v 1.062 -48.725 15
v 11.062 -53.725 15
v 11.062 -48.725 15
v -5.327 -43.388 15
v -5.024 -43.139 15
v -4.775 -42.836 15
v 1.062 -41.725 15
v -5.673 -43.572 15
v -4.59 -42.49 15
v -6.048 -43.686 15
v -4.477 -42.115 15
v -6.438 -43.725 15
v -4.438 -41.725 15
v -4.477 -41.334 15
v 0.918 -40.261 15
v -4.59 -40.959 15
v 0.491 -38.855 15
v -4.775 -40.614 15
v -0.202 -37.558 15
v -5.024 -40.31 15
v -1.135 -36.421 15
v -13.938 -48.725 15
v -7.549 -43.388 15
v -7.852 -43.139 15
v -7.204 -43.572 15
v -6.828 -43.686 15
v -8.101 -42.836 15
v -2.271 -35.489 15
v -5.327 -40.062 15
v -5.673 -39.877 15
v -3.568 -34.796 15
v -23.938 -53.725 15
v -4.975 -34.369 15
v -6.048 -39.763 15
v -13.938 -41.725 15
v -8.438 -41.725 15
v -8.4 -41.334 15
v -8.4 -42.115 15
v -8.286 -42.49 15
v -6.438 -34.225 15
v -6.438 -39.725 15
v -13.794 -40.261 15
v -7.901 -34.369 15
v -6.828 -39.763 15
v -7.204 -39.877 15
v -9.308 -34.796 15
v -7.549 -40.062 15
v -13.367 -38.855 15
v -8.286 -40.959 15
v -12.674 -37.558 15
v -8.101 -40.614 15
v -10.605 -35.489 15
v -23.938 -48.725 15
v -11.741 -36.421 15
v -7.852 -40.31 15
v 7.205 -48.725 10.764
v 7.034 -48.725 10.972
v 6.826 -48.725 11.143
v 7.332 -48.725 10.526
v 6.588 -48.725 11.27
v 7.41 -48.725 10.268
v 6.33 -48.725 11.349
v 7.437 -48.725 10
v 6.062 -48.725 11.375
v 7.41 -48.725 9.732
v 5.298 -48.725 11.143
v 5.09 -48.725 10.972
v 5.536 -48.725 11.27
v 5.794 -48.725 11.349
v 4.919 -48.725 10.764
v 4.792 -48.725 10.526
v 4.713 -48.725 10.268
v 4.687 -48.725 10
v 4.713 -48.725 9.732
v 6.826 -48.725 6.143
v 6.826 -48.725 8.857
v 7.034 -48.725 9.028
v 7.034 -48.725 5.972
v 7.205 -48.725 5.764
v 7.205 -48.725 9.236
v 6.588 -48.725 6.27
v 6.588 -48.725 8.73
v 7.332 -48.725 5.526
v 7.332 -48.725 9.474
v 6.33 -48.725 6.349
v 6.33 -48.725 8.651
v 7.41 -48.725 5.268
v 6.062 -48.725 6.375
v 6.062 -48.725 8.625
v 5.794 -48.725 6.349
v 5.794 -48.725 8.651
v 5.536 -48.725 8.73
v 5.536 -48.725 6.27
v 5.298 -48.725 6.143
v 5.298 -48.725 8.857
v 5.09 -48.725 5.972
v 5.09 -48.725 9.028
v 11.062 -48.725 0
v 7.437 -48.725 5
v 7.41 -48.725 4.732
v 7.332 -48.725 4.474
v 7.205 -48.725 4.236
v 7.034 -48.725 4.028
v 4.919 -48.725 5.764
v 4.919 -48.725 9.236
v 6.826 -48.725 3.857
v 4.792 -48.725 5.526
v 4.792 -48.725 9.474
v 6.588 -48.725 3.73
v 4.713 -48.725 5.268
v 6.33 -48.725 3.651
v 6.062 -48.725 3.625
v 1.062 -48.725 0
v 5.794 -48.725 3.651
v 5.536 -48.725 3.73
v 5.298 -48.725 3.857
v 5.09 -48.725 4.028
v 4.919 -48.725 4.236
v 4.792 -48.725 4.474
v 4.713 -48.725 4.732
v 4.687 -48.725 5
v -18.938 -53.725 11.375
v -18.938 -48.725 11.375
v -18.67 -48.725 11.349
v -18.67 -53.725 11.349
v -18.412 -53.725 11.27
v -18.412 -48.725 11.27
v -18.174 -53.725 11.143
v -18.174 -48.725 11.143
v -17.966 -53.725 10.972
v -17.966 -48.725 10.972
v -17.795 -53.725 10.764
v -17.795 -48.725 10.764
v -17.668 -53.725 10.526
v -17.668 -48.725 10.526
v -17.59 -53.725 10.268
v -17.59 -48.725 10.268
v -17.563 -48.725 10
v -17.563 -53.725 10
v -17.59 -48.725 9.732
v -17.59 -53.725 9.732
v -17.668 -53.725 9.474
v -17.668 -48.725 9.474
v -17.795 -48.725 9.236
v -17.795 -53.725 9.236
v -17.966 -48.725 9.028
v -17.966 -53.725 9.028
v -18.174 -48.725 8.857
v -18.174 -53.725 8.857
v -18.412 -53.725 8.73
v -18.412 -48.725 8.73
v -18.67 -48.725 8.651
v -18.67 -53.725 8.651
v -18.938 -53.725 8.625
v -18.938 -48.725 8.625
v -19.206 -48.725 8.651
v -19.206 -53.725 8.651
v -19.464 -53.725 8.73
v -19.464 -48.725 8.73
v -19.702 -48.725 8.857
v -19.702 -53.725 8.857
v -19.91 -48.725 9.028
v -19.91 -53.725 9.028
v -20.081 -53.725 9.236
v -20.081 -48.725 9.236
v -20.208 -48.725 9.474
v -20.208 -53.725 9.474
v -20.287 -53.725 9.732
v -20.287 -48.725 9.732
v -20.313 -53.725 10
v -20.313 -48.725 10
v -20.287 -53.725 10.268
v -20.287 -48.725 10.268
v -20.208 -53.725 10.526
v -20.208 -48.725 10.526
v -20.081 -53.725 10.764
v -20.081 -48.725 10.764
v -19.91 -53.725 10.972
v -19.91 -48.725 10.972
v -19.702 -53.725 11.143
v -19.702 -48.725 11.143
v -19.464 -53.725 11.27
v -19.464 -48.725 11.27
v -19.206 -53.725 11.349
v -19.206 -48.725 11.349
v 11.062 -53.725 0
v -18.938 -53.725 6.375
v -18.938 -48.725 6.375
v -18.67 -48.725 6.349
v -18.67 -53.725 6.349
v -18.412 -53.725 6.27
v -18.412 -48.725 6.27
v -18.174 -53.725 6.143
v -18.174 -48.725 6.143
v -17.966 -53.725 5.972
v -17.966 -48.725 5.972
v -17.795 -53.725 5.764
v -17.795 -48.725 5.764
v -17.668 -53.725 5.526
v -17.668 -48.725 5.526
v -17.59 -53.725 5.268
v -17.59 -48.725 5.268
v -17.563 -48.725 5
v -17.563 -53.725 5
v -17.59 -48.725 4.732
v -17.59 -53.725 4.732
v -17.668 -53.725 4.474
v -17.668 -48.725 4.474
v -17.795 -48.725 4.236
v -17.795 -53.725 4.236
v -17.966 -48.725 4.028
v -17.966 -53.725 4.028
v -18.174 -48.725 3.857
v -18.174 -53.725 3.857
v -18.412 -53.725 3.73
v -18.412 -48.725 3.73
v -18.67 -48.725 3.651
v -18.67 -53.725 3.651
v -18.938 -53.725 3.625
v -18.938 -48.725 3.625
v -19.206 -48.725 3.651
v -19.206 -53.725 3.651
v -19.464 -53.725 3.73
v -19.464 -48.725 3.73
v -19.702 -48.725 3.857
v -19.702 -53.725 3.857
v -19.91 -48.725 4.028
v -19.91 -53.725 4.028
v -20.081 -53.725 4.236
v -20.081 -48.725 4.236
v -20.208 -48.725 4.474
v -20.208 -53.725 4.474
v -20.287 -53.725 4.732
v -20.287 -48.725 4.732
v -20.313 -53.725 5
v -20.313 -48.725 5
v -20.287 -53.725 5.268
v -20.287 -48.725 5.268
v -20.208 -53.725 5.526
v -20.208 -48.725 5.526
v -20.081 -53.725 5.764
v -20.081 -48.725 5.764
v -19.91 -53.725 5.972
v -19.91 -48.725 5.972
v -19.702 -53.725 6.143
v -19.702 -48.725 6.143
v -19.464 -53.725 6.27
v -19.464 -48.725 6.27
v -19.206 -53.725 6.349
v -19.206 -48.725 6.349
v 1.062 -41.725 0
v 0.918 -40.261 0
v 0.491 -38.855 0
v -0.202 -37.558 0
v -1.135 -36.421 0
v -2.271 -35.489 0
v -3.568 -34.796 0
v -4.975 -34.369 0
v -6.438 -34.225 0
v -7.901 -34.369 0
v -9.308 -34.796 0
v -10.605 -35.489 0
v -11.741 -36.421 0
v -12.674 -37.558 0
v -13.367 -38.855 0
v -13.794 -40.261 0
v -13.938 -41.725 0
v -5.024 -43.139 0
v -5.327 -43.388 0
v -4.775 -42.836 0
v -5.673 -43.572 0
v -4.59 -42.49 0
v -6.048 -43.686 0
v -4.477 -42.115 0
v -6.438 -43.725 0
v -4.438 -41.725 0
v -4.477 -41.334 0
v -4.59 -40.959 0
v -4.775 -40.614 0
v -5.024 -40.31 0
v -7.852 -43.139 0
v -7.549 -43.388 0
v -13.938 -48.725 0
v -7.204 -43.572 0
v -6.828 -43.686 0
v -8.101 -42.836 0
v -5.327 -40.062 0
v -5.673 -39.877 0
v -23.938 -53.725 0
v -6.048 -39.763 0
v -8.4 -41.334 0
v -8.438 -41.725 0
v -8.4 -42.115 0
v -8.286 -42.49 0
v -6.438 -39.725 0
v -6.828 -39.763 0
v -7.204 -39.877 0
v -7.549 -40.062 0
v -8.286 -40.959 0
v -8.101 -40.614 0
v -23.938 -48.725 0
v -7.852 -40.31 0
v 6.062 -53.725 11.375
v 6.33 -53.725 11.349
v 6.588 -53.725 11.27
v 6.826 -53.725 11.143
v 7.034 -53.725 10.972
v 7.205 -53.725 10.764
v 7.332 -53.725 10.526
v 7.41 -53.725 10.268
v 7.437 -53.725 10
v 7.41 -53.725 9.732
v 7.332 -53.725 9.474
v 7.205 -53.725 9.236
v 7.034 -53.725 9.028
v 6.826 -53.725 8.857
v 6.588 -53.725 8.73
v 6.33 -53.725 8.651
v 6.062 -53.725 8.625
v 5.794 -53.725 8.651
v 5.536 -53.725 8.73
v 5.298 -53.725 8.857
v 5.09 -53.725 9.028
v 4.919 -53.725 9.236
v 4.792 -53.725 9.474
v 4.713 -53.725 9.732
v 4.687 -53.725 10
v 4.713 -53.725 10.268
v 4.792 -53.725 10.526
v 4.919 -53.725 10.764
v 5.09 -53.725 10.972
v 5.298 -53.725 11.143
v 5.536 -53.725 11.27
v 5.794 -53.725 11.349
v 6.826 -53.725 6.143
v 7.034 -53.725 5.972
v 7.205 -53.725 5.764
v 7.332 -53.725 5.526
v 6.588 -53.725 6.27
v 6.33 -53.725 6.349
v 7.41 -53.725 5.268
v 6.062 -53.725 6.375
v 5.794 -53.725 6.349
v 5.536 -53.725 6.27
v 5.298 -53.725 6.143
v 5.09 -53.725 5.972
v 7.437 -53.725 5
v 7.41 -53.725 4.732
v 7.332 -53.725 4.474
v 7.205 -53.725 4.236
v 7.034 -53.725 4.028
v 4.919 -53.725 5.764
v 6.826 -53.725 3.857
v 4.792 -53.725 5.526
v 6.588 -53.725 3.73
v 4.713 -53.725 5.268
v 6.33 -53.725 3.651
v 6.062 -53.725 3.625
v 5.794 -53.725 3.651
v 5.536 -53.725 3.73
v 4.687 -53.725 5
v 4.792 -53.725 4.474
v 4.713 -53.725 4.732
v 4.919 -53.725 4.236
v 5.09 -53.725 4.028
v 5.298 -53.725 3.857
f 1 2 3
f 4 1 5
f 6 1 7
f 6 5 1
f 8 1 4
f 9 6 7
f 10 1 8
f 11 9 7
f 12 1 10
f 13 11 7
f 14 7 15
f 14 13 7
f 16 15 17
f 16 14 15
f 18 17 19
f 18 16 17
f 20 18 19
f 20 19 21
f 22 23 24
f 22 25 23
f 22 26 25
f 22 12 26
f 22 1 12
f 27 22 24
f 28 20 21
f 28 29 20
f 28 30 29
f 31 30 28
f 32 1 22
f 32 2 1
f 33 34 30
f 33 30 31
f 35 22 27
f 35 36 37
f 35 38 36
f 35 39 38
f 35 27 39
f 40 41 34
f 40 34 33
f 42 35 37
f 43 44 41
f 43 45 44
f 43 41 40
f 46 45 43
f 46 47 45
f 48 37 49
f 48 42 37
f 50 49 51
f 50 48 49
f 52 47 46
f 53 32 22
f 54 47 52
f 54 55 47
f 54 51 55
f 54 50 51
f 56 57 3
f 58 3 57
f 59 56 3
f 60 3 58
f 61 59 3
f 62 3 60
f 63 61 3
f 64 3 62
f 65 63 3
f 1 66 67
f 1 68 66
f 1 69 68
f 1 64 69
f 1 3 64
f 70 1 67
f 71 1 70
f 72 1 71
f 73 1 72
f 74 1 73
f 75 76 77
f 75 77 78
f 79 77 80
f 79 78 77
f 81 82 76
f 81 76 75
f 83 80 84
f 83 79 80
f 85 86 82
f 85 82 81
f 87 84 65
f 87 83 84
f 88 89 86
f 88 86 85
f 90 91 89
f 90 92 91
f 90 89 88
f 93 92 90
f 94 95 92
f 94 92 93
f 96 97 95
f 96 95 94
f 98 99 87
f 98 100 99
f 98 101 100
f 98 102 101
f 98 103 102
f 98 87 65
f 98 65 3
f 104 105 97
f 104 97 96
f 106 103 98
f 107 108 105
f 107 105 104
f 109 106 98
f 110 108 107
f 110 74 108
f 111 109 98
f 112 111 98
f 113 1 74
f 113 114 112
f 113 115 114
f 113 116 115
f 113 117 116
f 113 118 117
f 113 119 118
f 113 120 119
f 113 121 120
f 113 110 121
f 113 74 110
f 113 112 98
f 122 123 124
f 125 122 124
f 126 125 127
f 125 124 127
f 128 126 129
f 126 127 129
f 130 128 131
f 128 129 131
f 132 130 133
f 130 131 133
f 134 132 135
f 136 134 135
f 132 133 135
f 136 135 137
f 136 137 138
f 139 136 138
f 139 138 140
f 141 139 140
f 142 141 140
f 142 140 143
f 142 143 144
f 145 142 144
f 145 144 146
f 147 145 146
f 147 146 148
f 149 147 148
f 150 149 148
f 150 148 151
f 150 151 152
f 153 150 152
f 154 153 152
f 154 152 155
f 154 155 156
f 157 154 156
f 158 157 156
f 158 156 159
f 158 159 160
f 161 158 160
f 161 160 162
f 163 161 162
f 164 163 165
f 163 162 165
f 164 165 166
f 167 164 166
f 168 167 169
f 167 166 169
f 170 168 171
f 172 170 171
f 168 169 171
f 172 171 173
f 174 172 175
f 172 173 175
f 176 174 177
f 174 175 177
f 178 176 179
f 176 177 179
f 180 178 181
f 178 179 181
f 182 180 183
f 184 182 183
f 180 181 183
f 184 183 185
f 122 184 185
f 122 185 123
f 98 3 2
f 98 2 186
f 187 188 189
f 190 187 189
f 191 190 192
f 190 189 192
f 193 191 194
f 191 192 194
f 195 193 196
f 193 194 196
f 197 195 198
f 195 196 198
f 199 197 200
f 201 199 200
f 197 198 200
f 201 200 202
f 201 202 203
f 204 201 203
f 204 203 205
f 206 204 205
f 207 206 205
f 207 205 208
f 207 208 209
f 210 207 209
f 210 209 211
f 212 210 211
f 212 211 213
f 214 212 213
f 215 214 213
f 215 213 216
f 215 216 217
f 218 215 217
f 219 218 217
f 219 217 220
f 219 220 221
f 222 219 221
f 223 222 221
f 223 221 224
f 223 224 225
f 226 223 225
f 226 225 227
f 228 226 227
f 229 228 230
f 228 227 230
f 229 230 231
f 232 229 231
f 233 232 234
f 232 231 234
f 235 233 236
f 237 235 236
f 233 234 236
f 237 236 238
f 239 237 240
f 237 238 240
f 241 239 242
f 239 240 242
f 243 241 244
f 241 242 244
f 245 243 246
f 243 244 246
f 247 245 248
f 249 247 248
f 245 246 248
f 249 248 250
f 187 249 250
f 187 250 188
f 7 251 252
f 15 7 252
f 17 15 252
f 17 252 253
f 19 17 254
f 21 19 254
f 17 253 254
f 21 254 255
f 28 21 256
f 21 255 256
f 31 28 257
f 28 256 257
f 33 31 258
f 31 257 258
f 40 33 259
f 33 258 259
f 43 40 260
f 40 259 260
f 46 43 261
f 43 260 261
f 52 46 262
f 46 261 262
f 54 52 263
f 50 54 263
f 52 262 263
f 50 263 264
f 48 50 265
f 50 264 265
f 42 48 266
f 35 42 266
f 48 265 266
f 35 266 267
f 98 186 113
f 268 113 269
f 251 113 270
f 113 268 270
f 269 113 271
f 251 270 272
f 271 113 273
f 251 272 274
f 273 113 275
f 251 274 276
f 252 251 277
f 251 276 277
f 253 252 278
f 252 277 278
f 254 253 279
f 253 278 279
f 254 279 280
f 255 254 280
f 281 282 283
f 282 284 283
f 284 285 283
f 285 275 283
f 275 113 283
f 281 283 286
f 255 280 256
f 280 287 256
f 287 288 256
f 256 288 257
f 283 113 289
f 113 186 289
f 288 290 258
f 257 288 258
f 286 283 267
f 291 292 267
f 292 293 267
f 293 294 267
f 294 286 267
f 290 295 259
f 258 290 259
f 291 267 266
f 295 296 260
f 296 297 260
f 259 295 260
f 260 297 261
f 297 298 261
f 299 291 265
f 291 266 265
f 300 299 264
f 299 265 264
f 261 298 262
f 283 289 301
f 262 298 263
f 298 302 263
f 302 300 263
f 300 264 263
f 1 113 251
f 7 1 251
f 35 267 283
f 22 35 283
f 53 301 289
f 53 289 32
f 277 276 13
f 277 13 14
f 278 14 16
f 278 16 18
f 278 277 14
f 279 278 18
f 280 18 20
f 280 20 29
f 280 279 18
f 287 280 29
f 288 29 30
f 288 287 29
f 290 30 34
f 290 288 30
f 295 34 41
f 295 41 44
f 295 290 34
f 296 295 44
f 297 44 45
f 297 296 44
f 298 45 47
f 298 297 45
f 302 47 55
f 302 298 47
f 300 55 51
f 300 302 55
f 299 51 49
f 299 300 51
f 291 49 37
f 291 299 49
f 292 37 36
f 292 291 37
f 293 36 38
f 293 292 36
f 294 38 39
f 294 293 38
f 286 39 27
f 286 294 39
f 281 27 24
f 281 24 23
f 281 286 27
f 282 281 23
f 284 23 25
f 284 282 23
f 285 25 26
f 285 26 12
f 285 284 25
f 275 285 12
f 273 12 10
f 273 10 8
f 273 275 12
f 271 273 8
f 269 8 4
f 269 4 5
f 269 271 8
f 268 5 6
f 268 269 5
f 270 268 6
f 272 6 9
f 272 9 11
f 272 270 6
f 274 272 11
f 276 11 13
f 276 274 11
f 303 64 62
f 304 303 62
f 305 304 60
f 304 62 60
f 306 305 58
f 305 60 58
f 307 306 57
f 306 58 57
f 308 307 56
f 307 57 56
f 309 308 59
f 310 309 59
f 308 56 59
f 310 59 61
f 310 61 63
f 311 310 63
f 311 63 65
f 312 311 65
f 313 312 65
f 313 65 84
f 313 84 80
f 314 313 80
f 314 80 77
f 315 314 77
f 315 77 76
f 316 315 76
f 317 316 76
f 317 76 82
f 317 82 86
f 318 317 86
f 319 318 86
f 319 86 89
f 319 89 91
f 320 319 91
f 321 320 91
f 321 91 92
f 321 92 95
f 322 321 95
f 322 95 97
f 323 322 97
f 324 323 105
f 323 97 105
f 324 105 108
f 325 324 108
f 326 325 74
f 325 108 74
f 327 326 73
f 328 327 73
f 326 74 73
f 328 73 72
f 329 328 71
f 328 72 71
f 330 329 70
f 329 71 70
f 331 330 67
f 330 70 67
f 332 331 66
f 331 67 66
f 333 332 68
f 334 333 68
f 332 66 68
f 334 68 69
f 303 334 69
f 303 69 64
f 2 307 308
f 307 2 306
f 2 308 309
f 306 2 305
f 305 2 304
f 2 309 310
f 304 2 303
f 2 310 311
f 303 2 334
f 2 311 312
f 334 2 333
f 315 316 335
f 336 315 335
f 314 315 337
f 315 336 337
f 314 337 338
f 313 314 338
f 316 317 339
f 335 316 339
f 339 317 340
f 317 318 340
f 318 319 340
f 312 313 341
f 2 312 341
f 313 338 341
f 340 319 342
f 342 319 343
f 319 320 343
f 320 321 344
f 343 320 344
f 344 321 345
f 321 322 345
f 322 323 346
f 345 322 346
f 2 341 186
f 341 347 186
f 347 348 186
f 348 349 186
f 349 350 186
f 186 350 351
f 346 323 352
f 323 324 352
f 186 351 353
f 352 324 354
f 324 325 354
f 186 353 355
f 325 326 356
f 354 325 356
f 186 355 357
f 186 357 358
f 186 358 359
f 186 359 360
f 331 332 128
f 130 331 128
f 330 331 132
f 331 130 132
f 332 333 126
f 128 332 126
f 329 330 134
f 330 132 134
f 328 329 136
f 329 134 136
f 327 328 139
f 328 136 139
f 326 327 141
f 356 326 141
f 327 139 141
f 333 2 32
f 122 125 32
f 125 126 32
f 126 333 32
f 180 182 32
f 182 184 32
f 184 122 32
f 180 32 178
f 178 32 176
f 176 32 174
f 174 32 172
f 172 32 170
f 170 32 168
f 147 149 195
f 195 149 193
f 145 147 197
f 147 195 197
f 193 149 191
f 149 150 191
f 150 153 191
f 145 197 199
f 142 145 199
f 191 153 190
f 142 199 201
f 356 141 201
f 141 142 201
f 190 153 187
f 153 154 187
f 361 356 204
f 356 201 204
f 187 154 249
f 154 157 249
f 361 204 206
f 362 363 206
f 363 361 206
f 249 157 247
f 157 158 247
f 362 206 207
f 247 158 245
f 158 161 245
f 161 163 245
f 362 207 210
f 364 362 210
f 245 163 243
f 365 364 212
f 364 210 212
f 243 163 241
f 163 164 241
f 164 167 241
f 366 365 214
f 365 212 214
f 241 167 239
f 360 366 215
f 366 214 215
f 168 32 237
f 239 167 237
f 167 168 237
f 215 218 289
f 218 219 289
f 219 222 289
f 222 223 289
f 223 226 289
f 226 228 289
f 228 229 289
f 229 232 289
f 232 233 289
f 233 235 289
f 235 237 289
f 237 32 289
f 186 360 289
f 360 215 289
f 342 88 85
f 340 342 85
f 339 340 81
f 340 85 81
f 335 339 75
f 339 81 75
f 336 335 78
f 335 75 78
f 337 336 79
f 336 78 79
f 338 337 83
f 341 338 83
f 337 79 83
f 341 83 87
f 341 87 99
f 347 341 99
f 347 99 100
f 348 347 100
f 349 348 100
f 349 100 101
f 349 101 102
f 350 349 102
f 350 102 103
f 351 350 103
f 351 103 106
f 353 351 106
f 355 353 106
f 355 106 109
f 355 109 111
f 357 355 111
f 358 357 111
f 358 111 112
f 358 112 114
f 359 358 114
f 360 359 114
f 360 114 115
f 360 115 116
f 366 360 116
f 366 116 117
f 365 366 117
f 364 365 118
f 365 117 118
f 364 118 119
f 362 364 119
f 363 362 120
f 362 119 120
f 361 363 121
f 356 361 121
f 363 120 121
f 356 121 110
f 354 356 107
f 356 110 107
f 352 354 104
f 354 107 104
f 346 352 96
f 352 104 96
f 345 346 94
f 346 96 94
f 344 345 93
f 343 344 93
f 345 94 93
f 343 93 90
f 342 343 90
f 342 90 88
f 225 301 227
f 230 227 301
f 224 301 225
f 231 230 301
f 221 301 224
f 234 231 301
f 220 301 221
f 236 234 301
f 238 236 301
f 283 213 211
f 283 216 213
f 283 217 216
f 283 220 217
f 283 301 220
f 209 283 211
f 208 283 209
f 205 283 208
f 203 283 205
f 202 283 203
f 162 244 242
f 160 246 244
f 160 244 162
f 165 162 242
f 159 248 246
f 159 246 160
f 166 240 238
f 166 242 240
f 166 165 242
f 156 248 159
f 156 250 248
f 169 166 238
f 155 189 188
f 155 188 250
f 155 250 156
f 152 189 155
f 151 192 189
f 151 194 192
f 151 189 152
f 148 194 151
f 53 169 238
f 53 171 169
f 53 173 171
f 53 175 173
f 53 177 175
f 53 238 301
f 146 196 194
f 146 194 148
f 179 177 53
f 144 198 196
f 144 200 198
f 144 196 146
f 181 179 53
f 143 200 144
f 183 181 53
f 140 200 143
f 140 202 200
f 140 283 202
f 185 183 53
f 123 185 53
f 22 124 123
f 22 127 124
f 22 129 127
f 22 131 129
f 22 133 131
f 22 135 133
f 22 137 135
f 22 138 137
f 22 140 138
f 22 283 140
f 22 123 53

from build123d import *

# Parameters (mm, degrees)
SKETCH1_R           = 2
BOSS_EXTRUDE1_DEPTH = 15
SKETCH8_W           = 15
SKETCH8_H           = 5
BOSS_EXTRUDE6_DEPTH = 10
SKETCH9_W           = 15
SKETCH9_H           = 5
BOSS_EXTRUDE7_DEPTH = 10
SKETCH10_R          = 1.375
CUT_EXTRUDE1_DEPTH  = 32.753503892


with BuildPart() as part:
    # Sketch1 → Boss-Extrude1 (new body)
    with BuildSketch(Plane.XY):
        with BuildLine():
            Line((-13.938149665, -41.724647752), (-13.938149665, -53.724647752))
            Line((-13.938149665, -53.724647752), (1.061850335, -53.724647752))
            Line((1.061850335, -53.724647752), (1.061850335, -41.724647752))
            ThreePointArc((1.061850335, -41.724647752), (-6.438149665, -34.224647752), (-13.938149665, -41.724647752))
        make_face()
        with Locations((-6.438149665, -41.724647752)):
            Circle(SKETCH1_R, mode=Mode.SUBTRACT)
    extrude(amount=BOSS_EXTRUDE1_DEPTH)

    # Sketch8 → Boss-Extrude6 (add)
    with BuildSketch(Plane.ZY.offset(13.938149665)):
        with Locations((7.5, -51.224647752)):
            Rectangle(SKETCH8_W, SKETCH8_H)
    extrude(amount=BOSS_EXTRUDE6_DEPTH)

    # Sketch9 → Boss-Extrude7 (add)
    with BuildSketch(Plane(origin=(1.061850335, 0, 0), x_dir=(0, 0, -1), z_dir=(1, 0, 0))):
        with Locations((-7.5, -51.224647752)):
            Rectangle(SKETCH9_W, SKETCH9_H)
    extrude(amount=BOSS_EXTRUDE7_DEPTH)

    # Sketch10 → Cut-Extrude1 (cut, through all)
    with BuildSketch(Plane(origin=(0, -48.724647752, 0), x_dir=(1, 0, 0), z_dir=(0, 1, 0))):
        with Locations(Location((6.061850335, -10, 0), (0, 0, 270))):
            Circle(SKETCH10_R)
        with Locations(Location((6.061850335, -5, 0), (0, 0, 270))):
            Circle(SKETCH10_R)
        with Locations(Location((-18.938149665, -10, 0), (0, 0, 270))):
            Circle(SKETCH10_R)
        with Locations(Location((-18.938149665, -5, 0), (0, 0, 270))):
            Circle(SKETCH10_R)
    extrude(amount=-CUT_EXTRUDE1_DEPTH, mode=Mode.SUBTRACT)


solid = part.part
